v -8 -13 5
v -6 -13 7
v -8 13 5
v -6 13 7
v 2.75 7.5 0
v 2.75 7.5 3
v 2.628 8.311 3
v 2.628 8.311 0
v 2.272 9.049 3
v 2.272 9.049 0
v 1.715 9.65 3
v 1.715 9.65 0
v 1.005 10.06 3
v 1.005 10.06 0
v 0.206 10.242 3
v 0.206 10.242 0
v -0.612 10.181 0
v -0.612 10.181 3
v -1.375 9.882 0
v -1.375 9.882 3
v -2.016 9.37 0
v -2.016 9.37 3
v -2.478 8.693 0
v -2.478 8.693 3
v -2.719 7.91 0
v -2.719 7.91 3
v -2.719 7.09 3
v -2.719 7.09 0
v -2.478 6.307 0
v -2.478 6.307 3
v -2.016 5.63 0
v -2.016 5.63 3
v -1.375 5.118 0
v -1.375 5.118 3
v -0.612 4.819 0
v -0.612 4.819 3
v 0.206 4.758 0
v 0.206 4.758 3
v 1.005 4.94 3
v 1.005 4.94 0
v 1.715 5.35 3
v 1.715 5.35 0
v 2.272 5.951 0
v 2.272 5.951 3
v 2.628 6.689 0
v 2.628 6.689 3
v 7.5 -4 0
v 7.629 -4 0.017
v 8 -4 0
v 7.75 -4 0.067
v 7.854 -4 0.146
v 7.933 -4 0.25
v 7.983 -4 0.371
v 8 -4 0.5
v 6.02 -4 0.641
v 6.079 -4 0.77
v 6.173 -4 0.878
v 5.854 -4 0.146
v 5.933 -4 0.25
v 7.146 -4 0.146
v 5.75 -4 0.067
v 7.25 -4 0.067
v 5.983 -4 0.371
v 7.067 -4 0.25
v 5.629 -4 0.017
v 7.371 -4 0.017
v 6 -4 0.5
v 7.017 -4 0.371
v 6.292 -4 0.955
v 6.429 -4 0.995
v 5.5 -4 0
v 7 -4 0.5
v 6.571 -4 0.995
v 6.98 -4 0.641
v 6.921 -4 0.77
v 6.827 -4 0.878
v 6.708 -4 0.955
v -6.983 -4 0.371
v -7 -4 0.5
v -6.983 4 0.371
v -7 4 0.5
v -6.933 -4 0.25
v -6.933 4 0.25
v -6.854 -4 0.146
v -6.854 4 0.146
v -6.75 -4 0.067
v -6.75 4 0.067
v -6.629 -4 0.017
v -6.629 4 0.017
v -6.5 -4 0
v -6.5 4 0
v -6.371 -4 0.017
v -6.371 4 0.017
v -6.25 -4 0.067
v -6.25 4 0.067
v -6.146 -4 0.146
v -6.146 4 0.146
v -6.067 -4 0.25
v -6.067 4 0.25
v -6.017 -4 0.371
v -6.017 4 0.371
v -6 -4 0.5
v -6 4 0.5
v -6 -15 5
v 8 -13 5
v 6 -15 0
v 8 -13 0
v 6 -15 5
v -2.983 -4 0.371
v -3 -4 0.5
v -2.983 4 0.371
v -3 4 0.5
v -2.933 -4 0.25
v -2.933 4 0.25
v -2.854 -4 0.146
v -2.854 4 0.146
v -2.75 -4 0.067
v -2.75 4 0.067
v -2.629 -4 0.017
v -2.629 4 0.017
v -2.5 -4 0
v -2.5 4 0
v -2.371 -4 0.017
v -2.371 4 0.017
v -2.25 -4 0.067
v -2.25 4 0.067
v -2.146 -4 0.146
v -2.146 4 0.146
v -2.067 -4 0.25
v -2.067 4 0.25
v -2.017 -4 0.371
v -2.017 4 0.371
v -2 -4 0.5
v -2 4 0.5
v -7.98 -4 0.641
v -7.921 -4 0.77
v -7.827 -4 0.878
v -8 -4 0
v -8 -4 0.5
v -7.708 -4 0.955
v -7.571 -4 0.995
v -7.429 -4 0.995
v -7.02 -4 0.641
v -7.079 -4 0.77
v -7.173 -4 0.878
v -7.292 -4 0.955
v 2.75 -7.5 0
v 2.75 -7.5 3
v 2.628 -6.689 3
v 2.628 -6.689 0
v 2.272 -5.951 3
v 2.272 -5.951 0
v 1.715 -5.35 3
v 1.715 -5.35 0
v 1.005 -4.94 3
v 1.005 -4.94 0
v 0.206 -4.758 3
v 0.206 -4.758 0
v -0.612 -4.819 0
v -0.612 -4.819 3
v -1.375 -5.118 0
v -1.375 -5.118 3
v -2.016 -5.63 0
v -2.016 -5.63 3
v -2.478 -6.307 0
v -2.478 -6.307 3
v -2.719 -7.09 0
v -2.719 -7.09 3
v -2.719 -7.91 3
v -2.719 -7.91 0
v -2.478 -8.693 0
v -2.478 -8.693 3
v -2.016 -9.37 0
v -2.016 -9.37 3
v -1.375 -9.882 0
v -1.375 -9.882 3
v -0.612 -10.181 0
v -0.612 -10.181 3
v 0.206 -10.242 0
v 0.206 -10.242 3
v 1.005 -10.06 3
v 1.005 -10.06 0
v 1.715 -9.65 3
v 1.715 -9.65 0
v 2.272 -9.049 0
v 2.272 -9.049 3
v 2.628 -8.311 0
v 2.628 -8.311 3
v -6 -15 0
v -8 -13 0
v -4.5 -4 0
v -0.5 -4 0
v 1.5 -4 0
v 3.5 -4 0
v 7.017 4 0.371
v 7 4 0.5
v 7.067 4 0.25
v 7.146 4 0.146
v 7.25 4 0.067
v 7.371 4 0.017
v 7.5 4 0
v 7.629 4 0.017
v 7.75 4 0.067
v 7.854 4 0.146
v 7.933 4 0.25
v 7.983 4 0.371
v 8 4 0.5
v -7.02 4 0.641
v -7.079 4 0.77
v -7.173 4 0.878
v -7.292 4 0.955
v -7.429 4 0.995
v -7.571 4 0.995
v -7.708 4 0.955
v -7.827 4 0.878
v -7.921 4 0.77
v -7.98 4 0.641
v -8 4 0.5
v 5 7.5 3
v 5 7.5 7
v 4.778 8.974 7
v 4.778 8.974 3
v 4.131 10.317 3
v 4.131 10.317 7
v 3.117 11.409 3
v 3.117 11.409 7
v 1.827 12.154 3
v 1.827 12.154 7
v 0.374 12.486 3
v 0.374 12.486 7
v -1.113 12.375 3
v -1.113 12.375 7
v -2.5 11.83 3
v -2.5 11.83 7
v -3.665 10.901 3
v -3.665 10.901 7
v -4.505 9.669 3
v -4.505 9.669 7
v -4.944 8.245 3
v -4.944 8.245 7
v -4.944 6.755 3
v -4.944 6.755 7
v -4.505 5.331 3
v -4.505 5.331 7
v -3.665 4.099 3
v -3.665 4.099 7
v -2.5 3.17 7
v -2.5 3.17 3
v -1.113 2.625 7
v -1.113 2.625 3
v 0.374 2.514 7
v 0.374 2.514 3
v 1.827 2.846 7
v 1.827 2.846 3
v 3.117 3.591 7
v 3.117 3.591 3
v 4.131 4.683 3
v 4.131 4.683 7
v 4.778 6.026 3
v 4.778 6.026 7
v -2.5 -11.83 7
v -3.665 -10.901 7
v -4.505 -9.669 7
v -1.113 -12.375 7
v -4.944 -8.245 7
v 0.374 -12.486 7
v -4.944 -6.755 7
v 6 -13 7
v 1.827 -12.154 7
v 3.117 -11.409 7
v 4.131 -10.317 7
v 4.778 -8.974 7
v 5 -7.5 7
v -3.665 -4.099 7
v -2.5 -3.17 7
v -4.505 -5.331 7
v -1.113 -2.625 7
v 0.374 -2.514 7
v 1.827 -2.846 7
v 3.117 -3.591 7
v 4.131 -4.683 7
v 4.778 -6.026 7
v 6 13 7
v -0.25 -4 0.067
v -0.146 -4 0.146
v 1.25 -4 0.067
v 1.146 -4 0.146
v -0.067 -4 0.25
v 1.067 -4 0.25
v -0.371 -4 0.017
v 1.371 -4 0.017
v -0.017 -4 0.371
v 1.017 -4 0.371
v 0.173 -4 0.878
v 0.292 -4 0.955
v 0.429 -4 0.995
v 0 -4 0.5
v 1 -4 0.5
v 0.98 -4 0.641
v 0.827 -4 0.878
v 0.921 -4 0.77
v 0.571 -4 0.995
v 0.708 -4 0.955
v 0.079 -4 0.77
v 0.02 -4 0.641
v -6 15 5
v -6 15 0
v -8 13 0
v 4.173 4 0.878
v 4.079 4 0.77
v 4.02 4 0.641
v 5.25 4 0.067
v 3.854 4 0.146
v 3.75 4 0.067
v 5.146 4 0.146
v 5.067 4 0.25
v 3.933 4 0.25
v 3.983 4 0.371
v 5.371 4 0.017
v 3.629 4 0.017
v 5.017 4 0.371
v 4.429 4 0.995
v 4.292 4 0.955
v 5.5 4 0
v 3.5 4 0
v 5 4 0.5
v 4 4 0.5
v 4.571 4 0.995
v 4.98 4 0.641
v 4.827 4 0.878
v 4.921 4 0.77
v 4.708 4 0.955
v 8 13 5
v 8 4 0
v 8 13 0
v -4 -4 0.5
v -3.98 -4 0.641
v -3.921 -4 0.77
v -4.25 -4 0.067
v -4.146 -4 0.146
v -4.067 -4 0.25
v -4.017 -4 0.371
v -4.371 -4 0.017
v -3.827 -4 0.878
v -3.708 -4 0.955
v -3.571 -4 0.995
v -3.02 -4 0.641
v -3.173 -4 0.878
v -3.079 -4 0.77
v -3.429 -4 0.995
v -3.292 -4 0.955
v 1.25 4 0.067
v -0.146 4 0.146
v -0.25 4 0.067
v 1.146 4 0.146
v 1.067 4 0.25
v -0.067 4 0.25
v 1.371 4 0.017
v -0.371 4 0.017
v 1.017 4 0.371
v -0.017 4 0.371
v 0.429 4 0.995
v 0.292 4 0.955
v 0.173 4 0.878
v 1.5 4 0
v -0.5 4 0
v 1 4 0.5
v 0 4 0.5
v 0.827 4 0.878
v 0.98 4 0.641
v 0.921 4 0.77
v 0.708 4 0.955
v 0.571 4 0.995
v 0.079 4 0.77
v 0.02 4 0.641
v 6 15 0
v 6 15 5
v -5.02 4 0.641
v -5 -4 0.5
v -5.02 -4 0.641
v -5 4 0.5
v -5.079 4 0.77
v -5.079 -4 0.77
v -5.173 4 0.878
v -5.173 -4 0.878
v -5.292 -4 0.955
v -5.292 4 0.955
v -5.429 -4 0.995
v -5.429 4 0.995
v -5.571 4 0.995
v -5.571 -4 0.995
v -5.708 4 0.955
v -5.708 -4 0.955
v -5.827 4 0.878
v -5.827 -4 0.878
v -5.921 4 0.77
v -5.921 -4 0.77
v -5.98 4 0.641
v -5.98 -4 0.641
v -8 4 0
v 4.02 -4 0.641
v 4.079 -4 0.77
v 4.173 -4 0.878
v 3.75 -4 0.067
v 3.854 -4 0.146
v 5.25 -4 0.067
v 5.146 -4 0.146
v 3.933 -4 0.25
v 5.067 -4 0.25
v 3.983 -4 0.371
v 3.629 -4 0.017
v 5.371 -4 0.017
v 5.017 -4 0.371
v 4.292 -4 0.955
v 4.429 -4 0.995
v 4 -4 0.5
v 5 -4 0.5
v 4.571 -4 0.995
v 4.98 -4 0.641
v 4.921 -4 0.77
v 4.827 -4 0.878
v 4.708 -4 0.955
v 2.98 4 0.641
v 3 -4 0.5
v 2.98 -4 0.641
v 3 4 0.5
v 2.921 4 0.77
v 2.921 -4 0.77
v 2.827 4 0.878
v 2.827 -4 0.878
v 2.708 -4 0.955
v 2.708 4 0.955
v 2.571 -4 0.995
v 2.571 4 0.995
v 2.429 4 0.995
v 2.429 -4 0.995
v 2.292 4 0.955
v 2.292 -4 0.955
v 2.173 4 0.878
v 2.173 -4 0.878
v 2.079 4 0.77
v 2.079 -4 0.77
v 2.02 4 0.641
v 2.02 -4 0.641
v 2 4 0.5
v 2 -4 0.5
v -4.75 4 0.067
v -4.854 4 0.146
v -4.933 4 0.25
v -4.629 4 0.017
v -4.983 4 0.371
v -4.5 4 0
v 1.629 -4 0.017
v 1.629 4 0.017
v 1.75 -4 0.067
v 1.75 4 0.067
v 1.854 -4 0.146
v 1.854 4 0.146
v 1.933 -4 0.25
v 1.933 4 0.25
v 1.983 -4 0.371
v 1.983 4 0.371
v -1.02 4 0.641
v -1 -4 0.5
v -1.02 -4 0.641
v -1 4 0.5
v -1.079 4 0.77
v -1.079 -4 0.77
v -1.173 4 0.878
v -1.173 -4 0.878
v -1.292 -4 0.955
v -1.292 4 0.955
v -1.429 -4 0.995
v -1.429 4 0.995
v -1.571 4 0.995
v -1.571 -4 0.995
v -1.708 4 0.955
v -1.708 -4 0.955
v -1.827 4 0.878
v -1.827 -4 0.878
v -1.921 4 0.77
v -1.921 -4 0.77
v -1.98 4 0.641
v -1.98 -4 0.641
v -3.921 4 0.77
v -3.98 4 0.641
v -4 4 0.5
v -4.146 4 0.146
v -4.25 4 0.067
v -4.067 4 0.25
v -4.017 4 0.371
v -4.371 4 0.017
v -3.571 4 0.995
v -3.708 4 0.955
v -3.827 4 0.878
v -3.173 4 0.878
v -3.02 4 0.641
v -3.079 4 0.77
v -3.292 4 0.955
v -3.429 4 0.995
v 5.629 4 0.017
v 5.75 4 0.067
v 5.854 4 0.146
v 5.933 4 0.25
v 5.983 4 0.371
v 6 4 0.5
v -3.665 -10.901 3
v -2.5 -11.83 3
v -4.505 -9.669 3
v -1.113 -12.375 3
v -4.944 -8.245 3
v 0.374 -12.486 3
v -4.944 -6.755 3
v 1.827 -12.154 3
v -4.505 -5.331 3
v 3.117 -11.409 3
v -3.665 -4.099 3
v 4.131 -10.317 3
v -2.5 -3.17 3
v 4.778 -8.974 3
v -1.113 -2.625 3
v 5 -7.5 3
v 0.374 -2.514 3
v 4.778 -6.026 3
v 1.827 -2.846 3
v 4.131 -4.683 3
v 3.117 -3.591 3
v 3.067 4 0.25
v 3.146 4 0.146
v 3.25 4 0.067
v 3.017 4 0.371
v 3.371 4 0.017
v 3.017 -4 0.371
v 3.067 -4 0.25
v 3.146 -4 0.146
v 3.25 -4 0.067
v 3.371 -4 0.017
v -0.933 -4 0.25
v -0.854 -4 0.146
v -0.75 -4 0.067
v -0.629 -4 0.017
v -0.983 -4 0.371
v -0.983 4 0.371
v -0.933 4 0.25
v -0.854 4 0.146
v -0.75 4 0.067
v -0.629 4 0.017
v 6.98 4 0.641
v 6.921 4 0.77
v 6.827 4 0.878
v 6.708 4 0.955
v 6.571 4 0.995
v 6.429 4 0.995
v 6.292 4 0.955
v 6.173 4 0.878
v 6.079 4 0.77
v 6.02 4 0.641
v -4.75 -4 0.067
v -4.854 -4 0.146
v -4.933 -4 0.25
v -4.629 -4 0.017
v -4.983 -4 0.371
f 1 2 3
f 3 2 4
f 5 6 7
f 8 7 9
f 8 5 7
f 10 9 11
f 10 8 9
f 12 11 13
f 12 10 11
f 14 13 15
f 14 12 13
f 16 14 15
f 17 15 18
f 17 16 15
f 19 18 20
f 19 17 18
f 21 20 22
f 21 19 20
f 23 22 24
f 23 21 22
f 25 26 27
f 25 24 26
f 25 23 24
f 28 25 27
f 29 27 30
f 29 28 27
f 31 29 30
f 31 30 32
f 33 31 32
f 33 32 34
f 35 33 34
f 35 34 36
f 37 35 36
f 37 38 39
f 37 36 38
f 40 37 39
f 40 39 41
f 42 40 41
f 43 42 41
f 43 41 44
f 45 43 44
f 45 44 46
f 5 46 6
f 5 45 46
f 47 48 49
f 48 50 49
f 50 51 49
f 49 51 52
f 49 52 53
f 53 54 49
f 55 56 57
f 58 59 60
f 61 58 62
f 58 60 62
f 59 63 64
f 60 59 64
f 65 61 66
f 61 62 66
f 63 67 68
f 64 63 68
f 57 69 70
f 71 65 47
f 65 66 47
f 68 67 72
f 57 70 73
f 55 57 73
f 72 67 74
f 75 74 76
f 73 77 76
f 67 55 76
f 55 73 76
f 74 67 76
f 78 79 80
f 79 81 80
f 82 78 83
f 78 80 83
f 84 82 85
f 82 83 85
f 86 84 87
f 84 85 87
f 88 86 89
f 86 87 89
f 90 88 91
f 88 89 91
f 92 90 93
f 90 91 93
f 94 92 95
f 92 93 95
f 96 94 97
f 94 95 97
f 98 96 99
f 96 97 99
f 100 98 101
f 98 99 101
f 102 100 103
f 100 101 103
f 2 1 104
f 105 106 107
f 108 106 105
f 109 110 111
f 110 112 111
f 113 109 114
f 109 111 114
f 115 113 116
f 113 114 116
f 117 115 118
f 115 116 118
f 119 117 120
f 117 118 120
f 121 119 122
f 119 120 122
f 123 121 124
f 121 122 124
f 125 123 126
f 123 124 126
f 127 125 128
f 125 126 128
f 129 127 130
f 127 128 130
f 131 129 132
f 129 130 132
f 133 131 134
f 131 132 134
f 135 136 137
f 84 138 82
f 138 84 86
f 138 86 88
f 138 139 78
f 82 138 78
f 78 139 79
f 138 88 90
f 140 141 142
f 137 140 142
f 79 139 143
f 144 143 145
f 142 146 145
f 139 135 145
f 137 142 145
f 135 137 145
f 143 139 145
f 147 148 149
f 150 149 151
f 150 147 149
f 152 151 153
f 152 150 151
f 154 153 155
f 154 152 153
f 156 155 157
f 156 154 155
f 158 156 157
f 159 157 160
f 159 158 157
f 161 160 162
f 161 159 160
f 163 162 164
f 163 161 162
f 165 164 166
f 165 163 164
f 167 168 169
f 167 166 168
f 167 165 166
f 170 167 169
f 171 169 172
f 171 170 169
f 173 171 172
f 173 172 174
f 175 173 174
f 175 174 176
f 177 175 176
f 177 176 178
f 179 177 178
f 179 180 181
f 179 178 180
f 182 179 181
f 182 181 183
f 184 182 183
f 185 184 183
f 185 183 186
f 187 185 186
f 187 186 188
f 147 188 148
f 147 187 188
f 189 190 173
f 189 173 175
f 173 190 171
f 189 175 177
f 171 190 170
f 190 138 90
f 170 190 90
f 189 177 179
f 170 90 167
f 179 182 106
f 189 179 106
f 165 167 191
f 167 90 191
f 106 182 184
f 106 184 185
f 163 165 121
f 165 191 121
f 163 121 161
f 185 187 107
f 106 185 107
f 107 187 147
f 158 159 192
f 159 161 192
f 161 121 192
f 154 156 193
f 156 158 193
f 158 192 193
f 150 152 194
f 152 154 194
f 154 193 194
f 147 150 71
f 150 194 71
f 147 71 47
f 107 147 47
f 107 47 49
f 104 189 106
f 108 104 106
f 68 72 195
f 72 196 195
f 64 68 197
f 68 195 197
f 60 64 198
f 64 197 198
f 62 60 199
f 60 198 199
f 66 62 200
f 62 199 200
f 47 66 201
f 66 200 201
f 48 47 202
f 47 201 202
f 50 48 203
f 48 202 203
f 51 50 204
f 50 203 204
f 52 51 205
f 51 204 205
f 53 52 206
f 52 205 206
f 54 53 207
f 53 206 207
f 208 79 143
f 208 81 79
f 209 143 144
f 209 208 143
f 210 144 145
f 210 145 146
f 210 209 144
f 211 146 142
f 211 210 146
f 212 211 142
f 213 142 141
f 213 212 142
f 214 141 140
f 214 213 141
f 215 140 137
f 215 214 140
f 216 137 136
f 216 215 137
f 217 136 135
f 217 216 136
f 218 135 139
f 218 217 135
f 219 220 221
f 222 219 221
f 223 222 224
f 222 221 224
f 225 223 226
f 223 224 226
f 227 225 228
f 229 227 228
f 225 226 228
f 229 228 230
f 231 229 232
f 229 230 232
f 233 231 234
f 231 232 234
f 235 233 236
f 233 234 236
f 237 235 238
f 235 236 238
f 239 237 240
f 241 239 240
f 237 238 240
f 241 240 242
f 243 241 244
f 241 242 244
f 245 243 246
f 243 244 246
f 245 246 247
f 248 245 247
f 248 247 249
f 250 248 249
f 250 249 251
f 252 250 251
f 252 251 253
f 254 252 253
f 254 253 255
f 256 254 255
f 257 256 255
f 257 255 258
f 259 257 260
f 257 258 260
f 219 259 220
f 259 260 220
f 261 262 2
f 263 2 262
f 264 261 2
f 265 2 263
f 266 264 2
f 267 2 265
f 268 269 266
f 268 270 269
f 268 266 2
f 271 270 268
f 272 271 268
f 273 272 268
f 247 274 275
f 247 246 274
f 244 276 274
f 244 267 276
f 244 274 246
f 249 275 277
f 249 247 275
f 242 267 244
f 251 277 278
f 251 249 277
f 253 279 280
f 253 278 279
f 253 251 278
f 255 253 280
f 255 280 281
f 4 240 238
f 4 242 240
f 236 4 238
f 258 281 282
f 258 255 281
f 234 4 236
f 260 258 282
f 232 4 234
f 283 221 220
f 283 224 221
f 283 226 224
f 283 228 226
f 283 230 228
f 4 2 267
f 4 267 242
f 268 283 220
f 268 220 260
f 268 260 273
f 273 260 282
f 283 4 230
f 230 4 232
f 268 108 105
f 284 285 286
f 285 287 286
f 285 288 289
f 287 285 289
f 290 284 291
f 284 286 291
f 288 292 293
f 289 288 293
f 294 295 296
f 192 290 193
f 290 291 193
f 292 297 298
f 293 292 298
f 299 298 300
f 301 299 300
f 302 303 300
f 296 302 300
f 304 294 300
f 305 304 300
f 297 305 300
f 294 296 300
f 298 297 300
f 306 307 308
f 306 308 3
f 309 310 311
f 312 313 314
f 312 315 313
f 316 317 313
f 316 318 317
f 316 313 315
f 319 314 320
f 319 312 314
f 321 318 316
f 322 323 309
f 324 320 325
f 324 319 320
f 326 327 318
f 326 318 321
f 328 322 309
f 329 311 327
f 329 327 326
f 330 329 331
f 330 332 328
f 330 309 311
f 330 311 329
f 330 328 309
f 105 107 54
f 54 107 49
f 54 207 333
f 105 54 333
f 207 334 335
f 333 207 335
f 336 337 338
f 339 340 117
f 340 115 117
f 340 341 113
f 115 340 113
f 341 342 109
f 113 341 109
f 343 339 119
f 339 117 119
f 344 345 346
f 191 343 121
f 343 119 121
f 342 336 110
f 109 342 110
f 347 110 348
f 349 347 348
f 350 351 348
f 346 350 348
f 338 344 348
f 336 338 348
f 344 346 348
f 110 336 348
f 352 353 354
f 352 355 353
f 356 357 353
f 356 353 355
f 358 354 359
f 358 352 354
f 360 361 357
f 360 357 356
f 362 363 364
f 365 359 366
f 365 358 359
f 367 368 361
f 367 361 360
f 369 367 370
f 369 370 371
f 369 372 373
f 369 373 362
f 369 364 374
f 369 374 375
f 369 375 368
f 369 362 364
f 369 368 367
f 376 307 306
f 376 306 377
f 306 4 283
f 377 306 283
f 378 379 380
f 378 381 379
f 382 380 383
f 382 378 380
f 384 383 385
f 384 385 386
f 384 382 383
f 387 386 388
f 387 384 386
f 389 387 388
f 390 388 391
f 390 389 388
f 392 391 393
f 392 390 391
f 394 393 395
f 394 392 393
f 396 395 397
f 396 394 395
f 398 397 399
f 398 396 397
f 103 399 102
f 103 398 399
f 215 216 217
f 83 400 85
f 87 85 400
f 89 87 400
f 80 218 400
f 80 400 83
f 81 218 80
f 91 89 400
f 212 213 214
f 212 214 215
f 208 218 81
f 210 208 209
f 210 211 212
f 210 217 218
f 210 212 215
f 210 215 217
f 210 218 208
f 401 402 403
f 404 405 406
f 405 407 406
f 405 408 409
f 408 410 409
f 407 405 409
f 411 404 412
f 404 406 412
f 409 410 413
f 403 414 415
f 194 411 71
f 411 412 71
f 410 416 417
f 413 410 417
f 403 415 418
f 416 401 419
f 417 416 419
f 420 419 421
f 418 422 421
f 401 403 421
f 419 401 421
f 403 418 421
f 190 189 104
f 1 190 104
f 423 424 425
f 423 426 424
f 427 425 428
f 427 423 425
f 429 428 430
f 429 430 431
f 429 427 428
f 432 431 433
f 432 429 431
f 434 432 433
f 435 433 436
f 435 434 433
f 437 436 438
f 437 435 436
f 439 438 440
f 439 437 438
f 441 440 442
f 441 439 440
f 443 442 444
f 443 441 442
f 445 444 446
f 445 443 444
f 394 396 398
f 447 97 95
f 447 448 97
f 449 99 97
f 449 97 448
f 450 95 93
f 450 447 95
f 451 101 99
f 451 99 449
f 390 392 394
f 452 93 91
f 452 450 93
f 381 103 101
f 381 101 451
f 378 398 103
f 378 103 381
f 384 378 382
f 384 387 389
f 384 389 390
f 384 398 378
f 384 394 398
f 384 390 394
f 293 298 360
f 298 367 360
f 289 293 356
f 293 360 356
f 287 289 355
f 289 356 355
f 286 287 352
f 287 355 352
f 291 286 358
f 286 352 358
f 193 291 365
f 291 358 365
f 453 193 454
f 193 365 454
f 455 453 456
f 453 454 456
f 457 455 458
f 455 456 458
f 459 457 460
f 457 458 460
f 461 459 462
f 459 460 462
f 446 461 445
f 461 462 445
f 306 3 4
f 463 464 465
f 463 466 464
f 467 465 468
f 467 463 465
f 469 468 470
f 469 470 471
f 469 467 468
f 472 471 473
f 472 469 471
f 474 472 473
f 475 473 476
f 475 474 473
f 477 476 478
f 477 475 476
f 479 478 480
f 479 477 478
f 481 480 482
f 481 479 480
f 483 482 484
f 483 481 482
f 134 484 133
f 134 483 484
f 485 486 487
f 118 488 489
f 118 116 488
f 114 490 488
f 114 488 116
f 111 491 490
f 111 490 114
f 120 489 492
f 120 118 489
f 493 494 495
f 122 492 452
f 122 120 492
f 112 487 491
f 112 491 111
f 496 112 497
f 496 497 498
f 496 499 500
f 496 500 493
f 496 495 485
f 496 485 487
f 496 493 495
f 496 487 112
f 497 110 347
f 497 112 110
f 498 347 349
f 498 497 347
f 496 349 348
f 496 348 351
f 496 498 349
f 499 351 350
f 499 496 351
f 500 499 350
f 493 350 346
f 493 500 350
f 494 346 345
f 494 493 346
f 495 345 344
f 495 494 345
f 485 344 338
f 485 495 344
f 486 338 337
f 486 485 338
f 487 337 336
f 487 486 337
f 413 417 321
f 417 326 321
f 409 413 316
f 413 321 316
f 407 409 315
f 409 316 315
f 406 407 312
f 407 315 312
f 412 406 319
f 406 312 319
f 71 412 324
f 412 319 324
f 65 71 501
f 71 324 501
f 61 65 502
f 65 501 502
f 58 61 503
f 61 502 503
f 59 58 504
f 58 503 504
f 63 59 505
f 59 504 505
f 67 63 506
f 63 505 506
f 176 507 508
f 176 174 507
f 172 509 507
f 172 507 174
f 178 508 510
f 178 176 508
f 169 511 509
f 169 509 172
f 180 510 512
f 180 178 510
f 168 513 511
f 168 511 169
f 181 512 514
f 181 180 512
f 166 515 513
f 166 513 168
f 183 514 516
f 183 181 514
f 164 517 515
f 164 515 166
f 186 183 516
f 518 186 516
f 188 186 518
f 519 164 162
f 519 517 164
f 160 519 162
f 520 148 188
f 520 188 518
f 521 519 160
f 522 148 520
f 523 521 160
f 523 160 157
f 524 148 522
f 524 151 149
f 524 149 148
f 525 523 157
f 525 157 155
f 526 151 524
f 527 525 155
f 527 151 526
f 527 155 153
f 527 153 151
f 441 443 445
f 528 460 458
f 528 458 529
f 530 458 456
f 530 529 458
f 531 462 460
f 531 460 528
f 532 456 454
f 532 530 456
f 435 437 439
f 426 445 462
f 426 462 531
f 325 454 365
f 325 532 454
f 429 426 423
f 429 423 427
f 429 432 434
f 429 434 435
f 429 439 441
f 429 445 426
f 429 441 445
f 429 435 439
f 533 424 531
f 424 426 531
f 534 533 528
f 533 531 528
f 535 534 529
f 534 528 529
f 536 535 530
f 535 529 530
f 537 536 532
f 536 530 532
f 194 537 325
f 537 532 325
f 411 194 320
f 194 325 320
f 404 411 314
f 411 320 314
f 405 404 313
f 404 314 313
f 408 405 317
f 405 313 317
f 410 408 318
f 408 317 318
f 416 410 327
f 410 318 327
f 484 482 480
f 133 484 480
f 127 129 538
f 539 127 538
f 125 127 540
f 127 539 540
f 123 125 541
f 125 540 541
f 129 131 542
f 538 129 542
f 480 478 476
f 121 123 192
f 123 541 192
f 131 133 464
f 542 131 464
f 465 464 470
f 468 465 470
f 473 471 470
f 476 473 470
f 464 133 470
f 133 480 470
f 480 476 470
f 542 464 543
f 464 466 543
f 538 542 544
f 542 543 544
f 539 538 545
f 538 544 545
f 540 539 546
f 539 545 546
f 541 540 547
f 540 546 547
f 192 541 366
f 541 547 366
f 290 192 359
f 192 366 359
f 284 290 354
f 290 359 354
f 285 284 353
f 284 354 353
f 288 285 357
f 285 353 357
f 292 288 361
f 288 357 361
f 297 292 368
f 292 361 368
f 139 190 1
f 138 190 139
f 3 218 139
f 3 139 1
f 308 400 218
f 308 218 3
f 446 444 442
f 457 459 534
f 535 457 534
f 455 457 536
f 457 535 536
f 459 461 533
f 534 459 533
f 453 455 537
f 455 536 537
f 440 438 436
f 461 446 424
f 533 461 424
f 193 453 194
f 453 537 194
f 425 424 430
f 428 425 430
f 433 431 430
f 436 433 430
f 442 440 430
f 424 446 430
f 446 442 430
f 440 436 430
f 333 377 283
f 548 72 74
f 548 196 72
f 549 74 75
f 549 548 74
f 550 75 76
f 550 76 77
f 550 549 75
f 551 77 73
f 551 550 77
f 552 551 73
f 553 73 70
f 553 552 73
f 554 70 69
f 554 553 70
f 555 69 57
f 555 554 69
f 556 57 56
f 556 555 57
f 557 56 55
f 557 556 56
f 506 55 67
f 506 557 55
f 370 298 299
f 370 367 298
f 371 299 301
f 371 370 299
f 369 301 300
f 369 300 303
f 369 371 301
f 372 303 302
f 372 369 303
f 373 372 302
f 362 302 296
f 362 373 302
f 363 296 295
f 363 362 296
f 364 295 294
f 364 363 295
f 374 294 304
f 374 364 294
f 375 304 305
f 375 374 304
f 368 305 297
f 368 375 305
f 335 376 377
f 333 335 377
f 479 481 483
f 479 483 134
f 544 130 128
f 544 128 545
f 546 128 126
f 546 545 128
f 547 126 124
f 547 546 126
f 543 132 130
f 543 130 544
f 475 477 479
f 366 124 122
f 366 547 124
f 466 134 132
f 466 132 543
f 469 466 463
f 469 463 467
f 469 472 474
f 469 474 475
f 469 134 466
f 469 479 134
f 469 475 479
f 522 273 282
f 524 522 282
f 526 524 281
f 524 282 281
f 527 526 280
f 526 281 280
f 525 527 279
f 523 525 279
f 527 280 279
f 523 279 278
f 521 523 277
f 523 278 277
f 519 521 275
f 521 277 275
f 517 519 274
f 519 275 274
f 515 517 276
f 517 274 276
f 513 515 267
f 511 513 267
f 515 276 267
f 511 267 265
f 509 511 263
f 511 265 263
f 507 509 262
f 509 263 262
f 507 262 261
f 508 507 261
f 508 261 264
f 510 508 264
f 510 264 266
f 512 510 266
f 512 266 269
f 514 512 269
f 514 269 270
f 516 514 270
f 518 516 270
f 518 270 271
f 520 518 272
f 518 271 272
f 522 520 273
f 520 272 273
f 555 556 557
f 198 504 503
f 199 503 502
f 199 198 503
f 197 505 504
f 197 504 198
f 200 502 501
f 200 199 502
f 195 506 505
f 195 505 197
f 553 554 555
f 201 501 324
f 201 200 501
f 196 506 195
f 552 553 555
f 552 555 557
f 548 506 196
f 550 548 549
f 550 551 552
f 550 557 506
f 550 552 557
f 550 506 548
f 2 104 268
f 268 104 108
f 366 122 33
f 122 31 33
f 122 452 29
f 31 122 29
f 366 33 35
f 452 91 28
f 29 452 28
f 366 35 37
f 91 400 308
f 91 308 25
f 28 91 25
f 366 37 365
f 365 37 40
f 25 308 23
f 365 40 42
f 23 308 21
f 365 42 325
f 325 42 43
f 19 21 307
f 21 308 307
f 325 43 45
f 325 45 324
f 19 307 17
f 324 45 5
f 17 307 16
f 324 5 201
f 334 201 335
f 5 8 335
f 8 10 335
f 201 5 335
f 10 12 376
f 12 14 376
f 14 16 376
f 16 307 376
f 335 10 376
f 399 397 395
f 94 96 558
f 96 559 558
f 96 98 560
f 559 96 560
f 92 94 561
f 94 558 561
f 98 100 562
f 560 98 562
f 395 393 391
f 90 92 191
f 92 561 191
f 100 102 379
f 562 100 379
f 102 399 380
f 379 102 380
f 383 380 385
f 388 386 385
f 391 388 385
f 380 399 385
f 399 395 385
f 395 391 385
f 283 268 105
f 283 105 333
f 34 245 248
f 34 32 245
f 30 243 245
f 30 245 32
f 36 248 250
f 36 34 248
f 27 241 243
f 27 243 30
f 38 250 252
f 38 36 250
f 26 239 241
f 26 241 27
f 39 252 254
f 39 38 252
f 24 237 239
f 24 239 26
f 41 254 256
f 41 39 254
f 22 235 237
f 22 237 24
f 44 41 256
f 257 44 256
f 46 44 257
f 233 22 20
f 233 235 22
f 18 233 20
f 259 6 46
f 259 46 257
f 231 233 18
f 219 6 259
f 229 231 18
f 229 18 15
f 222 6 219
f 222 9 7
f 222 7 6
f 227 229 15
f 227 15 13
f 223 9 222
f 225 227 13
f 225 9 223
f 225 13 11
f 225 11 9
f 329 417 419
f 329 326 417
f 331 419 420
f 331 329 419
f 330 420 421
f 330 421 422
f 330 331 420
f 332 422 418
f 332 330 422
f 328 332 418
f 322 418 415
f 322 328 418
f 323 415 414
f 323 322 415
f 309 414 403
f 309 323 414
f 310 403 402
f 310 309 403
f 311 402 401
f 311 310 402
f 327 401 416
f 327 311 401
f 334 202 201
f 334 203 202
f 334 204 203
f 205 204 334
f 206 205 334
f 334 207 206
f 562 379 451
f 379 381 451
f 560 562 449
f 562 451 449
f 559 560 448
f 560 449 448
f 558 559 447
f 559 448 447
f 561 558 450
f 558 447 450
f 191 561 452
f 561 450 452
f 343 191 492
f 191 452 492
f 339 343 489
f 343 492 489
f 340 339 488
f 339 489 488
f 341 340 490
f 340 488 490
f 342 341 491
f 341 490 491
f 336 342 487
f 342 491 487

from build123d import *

# Parameters (mm, degrees)
SKETCH_W          = 16
SKETCH_H          = 30
SKETCH_R          = 2.75
PAD_DEPTH         = 7
POCKET_DEPTH      = 4
POCKET_DEPTH_BACK = -4
CHAMFER_SIZE      = 2
SKETCH002_R       = 5
POCKET001_DEPTH   = 4


with BuildPart() as part:
    # Sketch → Pad (new body)
    with BuildSketch(Plane.XY):
        Rectangle(SKETCH_W, SKETCH_H)
        with Locations((0, 7.5)):
            Circle(SKETCH_R, mode=Mode.SUBTRACT)
        with Locations((0, -7.5)):
            Circle(SKETCH_R, mode=Mode.SUBTRACT)
    extrude(amount=PAD_DEPTH)

    # Sketch001 → Pocket (cut, two sides)
    with BuildSketch(Plane.XZ) as pocket_sk:
        with BuildLine():
            ThreePointArc((-7, 0.5), (-7.5, 1), (-8, 0.5))
            Line((-8, 0.5), (-8, -1.5))
            Line((-8, -1.5), (0, -1.5))
            Line((8, -1.5), (0, -1.5))
            Line((8, 0.499993), (8, -1.5))
            ThreePointArc((7, 0.5), (7.499996, 0), (8, 0.499993))
            ThreePointArc((7, 0.5), (6.5, 1), (6, 0.5))
            ThreePointArc((5, 0.5), (5.5, 0), (6, 0.5))
            ThreePointArc((5, 0.5), (4.5, 1), (4, 0.5))
            ThreePointArc((3, 0.5), (3.5, 0), (4, 0.5))
            ThreePointArc((3, 0.5), (2.5, 1), (2, 0.5))
            ThreePointArc((1, 0.5), (1.5, 0), (2, 0.5))
            ThreePointArc((1, 0.5), (0.5, 1), (0, 0.5))
            ThreePointArc((-1, 0.5), (-0.5, 0), (0, 0.5))
            ThreePointArc((-1, 0.5), (-1.5, 1), (-2, 0.5))
            ThreePointArc((-3, 0.5), (-2.5, 0), (-2, 0.5))
            ThreePointArc((-3, 0.5), (-3.5, 1), (-4, 0.5))
            ThreePointArc((-5, 0.5), (-4.5, 0), (-4, 0.5))
            ThreePointArc((-5, 0.5), (-5.5, 1), (-6, 0.5))
            ThreePointArc((-7, 0.5), (-6.5, 0), (-6, 0.5))
        make_face()
    extrude(amount=-POCKET_DEPTH, mode=Mode.SUBTRACT)
    extrude(pocket_sk.sketch, amount=-POCKET_DEPTH_BACK, mode=Mode.SUBTRACT)

    # Chamfer
    chamfer_edges = [part.edges().sort_by_distance(p)[0] for p in [
        (8, 15, 3.5),
        (-8, 15, 3.5),
        (-8, -15, 3.5),
        (-8, 0, 7),
        (0, 15, 7),
        (8, -15, 3.5),
        (0, -15, 7),
        (8, 0, 7),
    ]]
    chamfer(chamfer_edges, length=CHAMFER_SIZE)

    # Sketch002 (on DatumPlane) → Pocket001 (cut)
    with BuildSketch(Plane.XY.offset(7)):
        with Locations((0, 7.5)):
            Circle(SKETCH002_R)
        with Locations((0, -7.5)):
            Circle(SKETCH002_R)
    extrude(amount=-POCKET001_DEPTH, mode=Mode.SUBTRACT)


solid = part.part
